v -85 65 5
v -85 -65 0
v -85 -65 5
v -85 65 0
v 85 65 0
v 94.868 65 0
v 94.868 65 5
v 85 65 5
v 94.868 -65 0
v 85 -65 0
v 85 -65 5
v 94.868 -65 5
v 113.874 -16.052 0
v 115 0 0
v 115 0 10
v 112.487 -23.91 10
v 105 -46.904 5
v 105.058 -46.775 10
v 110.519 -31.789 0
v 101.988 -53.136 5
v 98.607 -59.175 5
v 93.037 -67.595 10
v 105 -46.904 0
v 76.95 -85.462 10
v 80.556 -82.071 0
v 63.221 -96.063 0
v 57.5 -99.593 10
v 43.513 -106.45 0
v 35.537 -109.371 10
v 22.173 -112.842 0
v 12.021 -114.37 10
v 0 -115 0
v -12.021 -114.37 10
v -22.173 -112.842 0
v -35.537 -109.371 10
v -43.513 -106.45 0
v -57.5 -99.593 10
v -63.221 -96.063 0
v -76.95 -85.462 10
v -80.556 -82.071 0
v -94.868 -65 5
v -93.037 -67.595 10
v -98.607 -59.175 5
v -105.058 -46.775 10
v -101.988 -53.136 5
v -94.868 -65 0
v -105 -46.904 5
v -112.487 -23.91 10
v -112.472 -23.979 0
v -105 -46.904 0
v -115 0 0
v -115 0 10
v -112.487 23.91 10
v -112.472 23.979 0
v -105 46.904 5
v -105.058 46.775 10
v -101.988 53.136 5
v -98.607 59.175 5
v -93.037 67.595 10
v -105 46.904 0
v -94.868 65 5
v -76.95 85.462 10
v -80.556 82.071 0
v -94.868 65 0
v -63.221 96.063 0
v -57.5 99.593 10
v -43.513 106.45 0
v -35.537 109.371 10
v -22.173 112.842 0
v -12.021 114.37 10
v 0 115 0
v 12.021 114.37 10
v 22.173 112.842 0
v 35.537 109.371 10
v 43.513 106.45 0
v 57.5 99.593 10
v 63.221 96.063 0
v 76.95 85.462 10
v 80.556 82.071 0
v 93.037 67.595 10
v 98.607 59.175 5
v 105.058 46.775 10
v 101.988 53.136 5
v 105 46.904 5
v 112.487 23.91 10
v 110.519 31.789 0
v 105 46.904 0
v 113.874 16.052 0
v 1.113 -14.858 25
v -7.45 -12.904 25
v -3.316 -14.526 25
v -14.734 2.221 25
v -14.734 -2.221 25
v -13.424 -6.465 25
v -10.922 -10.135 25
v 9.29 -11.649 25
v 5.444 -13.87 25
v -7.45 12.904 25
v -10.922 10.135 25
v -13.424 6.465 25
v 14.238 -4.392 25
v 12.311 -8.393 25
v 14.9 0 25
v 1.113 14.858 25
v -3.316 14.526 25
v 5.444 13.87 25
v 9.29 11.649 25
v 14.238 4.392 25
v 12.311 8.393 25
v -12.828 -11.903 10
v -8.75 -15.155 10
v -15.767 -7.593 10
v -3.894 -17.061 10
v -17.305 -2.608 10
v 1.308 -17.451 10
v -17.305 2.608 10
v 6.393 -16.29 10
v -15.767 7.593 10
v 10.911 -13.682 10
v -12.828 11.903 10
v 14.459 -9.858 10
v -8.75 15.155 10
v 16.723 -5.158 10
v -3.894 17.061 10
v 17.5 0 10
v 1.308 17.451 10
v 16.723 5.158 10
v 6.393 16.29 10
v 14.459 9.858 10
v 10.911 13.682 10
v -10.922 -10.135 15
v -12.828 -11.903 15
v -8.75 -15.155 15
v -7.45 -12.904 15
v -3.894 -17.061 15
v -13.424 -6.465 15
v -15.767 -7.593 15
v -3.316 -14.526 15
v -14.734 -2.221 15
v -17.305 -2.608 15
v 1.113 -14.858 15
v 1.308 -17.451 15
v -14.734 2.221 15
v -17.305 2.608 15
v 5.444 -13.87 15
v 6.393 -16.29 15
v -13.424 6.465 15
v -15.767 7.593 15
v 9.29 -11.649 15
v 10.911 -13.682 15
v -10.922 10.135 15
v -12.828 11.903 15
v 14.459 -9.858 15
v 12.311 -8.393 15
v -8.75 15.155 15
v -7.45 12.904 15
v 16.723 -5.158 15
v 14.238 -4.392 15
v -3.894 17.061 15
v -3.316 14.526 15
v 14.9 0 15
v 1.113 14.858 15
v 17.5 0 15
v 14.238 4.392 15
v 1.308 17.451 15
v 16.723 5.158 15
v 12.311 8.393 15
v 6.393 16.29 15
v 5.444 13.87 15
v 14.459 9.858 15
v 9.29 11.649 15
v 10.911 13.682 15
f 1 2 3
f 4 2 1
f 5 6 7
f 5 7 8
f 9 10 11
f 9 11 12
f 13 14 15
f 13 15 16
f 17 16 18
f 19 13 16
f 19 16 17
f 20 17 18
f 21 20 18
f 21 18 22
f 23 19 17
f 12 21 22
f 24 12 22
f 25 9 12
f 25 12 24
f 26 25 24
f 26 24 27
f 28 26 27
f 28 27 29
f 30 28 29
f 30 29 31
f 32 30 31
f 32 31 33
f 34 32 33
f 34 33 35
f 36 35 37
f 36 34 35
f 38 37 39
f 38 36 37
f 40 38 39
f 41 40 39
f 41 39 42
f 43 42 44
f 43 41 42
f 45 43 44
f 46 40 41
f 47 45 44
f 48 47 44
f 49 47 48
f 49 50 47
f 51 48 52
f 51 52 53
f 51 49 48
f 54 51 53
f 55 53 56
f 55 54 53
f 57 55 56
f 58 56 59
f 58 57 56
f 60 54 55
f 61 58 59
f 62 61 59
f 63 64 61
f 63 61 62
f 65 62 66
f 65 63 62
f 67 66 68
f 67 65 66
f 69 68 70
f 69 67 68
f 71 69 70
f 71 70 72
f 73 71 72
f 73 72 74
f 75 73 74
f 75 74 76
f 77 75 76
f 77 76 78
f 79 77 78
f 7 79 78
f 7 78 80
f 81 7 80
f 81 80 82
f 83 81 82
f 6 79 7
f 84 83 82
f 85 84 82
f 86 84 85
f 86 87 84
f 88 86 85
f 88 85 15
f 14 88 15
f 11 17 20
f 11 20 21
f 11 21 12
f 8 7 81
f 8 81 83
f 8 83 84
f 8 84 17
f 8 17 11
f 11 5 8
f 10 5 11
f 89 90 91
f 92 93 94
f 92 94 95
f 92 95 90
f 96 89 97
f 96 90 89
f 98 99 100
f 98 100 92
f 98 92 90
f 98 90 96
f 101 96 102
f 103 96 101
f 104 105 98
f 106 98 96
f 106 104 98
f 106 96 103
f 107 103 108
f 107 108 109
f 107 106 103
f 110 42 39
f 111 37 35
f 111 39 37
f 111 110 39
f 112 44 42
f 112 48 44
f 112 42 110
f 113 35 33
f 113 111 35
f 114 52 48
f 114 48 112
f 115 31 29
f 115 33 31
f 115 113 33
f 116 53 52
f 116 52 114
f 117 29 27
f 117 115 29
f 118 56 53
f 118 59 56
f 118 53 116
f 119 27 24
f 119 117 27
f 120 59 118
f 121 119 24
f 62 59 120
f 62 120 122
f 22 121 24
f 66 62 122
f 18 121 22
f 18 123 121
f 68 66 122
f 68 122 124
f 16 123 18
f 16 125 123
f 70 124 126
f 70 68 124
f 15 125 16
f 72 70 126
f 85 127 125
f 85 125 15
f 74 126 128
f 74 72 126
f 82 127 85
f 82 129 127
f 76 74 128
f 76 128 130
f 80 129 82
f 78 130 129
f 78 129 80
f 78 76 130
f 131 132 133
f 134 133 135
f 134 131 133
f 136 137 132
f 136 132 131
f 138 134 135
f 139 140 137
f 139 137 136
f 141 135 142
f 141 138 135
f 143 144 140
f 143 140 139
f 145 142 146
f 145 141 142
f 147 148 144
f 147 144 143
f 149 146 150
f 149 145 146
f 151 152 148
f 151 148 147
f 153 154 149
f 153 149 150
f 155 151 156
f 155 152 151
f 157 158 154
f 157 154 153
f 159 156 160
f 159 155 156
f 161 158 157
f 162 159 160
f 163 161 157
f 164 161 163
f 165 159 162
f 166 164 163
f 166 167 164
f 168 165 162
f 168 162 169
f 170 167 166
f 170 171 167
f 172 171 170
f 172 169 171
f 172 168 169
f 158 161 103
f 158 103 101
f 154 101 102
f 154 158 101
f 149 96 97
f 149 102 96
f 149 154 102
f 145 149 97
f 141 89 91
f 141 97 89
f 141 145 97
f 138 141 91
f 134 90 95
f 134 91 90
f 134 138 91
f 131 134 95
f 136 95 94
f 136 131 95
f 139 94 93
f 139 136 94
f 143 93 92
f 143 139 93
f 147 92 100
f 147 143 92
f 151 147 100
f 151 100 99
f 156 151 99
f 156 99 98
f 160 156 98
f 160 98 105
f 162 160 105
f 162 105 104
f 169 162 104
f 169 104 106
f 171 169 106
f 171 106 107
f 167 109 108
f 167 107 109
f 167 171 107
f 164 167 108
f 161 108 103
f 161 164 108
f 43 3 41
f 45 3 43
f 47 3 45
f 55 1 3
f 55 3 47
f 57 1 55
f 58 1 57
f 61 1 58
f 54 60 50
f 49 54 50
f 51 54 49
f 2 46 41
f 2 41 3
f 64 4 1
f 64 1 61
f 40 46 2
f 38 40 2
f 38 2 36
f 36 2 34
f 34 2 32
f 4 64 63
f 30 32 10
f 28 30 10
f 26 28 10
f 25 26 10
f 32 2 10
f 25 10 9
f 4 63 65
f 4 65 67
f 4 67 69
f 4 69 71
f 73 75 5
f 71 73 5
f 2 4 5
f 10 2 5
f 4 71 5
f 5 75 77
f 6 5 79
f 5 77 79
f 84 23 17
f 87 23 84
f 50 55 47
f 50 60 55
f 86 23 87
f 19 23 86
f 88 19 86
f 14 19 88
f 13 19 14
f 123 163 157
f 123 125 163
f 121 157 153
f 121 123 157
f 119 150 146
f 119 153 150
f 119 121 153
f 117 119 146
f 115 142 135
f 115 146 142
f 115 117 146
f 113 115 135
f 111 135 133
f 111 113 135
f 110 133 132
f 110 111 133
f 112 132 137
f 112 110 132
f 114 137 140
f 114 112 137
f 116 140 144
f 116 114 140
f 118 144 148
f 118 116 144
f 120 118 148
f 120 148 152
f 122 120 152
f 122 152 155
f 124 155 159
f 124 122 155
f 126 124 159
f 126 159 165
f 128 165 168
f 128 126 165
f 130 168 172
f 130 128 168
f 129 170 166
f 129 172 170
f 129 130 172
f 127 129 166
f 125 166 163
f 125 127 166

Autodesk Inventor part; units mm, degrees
ref_plane "YZ Plane" through (0, 0, 0) normal (1, 0, 0) x (0, 1, 0)
ref_plane "XZ Plane" through (0, 0, 0) normal (0, 1, 0) x (-1, 0, 0)
ref_plane "XY Plane" through (0, 0, 0) normal (0, 0, 1) x (1, 0, 0)
sketch "Boceto1" plane through (0, 0, 0) normal (0, 0, 1) x (1, 0, 0)
  circle A0 centre (0, 0) radius 115
  line L0 (105, 0) -> (105, 65)
  line L1 (105, 65) -> (105, -65)
  line L2 (105, -65) -> (85, -65)
  line L3 (85, -65) -> (85, 65)
  line L4 (85, 65) -> (105, 65)
  line L5 (-105, 0) -> (-105, 65)
  line L6 (-105, 65) -> (-85, 65)
  line L7 (-85, 65) -> (-85, -65)
  line L8 (-85, -65) -> (-105, -65)
  line L9 (-105, -65) -> (-105, 0)
  dimension "d0" = 230
  dimension "d33" = 65
  dimension "d34" = 130
  dimension "d35" = 20
  dimension "d36" = 65
  dimension "d37" = 20
extrude "Extrusión1" add sketch "Boceto1" along normal blind 10 contours A0 L1 L0 | L0 L1 A0 L2 L3 L4 | L4 L3 L2 A0 L8 L7 L6 | L6 L7 L8 A0 L9 L5 | L5 L9 A0
sketch "Boceto2" plane through (0, 0, 10) normal (0, 0, 1) x (1, 0, 0)
  circle A0 centre (0, 0) radius 17.5
  circle A1 centre (0, 0) radius 14.9
  dimension "d4" = 35
  dimension "d21" = 29.8
extrude "Extrusión2" add sketch "Boceto2" along normal blind 5 contours A0 | A1
sketch "Boceto3" plane through (0, 0, 15) normal (0, 0, 1) x (1, 0, 0)
  circle A0 centre (0, 0) radius 14.9
  dimension "d20" = 29.8
extrude "Extrusión3" [suppressed]
sketch "Boceto4" plane through (0, 0, 0) normal (0, 0, -1) x (-1, 0, 0)
  line L0 (105, 0) -> (-105, 0)
  line L1 (-105, 0) -> (-105, 65)
  line L2 (-105, 65) -> (-85, 65)
  line L3 (-85, 65) -> (-85, -65)
  line L4 (-85, -65) -> (-105, -65)
  line L5 (-105, -65) -> (-105, 0)
  line L6 (105, 0) -> (105, -65)
  line L7 (105, -65) -> (85, -65)
  line L8 (85, -65) -> (85, 65)
  line L9 (85, 65) -> (105, 65)
  line L10 (105, 65) -> (105, 0)
  point P0 (0, 0)
  dimension "d40" = 65
  dimension "d41" = 20
  dimension "d42" = 130
  dimension "d43" = 65
  dimension "d44" = 20
  dimension "d45" = 130
sketch "Boceto5" plane through (0, 0, 15) normal (0, 0, 1) x (1, 0, 0)
  circle A0 centre (0, 0) radius 14.9
  dimension "d22" = 29.8
extrude "Extrusión4" add sketch "Boceto5" along normal blind 10
ref_plane "Plano de trabajo2" through (0, 0, 5) normal (0, 0, -1) x (-1, 0, 0)
extrude "Extrusión5" cut sketch "Boceto4" against normal blind 5
properties part number "plato"
